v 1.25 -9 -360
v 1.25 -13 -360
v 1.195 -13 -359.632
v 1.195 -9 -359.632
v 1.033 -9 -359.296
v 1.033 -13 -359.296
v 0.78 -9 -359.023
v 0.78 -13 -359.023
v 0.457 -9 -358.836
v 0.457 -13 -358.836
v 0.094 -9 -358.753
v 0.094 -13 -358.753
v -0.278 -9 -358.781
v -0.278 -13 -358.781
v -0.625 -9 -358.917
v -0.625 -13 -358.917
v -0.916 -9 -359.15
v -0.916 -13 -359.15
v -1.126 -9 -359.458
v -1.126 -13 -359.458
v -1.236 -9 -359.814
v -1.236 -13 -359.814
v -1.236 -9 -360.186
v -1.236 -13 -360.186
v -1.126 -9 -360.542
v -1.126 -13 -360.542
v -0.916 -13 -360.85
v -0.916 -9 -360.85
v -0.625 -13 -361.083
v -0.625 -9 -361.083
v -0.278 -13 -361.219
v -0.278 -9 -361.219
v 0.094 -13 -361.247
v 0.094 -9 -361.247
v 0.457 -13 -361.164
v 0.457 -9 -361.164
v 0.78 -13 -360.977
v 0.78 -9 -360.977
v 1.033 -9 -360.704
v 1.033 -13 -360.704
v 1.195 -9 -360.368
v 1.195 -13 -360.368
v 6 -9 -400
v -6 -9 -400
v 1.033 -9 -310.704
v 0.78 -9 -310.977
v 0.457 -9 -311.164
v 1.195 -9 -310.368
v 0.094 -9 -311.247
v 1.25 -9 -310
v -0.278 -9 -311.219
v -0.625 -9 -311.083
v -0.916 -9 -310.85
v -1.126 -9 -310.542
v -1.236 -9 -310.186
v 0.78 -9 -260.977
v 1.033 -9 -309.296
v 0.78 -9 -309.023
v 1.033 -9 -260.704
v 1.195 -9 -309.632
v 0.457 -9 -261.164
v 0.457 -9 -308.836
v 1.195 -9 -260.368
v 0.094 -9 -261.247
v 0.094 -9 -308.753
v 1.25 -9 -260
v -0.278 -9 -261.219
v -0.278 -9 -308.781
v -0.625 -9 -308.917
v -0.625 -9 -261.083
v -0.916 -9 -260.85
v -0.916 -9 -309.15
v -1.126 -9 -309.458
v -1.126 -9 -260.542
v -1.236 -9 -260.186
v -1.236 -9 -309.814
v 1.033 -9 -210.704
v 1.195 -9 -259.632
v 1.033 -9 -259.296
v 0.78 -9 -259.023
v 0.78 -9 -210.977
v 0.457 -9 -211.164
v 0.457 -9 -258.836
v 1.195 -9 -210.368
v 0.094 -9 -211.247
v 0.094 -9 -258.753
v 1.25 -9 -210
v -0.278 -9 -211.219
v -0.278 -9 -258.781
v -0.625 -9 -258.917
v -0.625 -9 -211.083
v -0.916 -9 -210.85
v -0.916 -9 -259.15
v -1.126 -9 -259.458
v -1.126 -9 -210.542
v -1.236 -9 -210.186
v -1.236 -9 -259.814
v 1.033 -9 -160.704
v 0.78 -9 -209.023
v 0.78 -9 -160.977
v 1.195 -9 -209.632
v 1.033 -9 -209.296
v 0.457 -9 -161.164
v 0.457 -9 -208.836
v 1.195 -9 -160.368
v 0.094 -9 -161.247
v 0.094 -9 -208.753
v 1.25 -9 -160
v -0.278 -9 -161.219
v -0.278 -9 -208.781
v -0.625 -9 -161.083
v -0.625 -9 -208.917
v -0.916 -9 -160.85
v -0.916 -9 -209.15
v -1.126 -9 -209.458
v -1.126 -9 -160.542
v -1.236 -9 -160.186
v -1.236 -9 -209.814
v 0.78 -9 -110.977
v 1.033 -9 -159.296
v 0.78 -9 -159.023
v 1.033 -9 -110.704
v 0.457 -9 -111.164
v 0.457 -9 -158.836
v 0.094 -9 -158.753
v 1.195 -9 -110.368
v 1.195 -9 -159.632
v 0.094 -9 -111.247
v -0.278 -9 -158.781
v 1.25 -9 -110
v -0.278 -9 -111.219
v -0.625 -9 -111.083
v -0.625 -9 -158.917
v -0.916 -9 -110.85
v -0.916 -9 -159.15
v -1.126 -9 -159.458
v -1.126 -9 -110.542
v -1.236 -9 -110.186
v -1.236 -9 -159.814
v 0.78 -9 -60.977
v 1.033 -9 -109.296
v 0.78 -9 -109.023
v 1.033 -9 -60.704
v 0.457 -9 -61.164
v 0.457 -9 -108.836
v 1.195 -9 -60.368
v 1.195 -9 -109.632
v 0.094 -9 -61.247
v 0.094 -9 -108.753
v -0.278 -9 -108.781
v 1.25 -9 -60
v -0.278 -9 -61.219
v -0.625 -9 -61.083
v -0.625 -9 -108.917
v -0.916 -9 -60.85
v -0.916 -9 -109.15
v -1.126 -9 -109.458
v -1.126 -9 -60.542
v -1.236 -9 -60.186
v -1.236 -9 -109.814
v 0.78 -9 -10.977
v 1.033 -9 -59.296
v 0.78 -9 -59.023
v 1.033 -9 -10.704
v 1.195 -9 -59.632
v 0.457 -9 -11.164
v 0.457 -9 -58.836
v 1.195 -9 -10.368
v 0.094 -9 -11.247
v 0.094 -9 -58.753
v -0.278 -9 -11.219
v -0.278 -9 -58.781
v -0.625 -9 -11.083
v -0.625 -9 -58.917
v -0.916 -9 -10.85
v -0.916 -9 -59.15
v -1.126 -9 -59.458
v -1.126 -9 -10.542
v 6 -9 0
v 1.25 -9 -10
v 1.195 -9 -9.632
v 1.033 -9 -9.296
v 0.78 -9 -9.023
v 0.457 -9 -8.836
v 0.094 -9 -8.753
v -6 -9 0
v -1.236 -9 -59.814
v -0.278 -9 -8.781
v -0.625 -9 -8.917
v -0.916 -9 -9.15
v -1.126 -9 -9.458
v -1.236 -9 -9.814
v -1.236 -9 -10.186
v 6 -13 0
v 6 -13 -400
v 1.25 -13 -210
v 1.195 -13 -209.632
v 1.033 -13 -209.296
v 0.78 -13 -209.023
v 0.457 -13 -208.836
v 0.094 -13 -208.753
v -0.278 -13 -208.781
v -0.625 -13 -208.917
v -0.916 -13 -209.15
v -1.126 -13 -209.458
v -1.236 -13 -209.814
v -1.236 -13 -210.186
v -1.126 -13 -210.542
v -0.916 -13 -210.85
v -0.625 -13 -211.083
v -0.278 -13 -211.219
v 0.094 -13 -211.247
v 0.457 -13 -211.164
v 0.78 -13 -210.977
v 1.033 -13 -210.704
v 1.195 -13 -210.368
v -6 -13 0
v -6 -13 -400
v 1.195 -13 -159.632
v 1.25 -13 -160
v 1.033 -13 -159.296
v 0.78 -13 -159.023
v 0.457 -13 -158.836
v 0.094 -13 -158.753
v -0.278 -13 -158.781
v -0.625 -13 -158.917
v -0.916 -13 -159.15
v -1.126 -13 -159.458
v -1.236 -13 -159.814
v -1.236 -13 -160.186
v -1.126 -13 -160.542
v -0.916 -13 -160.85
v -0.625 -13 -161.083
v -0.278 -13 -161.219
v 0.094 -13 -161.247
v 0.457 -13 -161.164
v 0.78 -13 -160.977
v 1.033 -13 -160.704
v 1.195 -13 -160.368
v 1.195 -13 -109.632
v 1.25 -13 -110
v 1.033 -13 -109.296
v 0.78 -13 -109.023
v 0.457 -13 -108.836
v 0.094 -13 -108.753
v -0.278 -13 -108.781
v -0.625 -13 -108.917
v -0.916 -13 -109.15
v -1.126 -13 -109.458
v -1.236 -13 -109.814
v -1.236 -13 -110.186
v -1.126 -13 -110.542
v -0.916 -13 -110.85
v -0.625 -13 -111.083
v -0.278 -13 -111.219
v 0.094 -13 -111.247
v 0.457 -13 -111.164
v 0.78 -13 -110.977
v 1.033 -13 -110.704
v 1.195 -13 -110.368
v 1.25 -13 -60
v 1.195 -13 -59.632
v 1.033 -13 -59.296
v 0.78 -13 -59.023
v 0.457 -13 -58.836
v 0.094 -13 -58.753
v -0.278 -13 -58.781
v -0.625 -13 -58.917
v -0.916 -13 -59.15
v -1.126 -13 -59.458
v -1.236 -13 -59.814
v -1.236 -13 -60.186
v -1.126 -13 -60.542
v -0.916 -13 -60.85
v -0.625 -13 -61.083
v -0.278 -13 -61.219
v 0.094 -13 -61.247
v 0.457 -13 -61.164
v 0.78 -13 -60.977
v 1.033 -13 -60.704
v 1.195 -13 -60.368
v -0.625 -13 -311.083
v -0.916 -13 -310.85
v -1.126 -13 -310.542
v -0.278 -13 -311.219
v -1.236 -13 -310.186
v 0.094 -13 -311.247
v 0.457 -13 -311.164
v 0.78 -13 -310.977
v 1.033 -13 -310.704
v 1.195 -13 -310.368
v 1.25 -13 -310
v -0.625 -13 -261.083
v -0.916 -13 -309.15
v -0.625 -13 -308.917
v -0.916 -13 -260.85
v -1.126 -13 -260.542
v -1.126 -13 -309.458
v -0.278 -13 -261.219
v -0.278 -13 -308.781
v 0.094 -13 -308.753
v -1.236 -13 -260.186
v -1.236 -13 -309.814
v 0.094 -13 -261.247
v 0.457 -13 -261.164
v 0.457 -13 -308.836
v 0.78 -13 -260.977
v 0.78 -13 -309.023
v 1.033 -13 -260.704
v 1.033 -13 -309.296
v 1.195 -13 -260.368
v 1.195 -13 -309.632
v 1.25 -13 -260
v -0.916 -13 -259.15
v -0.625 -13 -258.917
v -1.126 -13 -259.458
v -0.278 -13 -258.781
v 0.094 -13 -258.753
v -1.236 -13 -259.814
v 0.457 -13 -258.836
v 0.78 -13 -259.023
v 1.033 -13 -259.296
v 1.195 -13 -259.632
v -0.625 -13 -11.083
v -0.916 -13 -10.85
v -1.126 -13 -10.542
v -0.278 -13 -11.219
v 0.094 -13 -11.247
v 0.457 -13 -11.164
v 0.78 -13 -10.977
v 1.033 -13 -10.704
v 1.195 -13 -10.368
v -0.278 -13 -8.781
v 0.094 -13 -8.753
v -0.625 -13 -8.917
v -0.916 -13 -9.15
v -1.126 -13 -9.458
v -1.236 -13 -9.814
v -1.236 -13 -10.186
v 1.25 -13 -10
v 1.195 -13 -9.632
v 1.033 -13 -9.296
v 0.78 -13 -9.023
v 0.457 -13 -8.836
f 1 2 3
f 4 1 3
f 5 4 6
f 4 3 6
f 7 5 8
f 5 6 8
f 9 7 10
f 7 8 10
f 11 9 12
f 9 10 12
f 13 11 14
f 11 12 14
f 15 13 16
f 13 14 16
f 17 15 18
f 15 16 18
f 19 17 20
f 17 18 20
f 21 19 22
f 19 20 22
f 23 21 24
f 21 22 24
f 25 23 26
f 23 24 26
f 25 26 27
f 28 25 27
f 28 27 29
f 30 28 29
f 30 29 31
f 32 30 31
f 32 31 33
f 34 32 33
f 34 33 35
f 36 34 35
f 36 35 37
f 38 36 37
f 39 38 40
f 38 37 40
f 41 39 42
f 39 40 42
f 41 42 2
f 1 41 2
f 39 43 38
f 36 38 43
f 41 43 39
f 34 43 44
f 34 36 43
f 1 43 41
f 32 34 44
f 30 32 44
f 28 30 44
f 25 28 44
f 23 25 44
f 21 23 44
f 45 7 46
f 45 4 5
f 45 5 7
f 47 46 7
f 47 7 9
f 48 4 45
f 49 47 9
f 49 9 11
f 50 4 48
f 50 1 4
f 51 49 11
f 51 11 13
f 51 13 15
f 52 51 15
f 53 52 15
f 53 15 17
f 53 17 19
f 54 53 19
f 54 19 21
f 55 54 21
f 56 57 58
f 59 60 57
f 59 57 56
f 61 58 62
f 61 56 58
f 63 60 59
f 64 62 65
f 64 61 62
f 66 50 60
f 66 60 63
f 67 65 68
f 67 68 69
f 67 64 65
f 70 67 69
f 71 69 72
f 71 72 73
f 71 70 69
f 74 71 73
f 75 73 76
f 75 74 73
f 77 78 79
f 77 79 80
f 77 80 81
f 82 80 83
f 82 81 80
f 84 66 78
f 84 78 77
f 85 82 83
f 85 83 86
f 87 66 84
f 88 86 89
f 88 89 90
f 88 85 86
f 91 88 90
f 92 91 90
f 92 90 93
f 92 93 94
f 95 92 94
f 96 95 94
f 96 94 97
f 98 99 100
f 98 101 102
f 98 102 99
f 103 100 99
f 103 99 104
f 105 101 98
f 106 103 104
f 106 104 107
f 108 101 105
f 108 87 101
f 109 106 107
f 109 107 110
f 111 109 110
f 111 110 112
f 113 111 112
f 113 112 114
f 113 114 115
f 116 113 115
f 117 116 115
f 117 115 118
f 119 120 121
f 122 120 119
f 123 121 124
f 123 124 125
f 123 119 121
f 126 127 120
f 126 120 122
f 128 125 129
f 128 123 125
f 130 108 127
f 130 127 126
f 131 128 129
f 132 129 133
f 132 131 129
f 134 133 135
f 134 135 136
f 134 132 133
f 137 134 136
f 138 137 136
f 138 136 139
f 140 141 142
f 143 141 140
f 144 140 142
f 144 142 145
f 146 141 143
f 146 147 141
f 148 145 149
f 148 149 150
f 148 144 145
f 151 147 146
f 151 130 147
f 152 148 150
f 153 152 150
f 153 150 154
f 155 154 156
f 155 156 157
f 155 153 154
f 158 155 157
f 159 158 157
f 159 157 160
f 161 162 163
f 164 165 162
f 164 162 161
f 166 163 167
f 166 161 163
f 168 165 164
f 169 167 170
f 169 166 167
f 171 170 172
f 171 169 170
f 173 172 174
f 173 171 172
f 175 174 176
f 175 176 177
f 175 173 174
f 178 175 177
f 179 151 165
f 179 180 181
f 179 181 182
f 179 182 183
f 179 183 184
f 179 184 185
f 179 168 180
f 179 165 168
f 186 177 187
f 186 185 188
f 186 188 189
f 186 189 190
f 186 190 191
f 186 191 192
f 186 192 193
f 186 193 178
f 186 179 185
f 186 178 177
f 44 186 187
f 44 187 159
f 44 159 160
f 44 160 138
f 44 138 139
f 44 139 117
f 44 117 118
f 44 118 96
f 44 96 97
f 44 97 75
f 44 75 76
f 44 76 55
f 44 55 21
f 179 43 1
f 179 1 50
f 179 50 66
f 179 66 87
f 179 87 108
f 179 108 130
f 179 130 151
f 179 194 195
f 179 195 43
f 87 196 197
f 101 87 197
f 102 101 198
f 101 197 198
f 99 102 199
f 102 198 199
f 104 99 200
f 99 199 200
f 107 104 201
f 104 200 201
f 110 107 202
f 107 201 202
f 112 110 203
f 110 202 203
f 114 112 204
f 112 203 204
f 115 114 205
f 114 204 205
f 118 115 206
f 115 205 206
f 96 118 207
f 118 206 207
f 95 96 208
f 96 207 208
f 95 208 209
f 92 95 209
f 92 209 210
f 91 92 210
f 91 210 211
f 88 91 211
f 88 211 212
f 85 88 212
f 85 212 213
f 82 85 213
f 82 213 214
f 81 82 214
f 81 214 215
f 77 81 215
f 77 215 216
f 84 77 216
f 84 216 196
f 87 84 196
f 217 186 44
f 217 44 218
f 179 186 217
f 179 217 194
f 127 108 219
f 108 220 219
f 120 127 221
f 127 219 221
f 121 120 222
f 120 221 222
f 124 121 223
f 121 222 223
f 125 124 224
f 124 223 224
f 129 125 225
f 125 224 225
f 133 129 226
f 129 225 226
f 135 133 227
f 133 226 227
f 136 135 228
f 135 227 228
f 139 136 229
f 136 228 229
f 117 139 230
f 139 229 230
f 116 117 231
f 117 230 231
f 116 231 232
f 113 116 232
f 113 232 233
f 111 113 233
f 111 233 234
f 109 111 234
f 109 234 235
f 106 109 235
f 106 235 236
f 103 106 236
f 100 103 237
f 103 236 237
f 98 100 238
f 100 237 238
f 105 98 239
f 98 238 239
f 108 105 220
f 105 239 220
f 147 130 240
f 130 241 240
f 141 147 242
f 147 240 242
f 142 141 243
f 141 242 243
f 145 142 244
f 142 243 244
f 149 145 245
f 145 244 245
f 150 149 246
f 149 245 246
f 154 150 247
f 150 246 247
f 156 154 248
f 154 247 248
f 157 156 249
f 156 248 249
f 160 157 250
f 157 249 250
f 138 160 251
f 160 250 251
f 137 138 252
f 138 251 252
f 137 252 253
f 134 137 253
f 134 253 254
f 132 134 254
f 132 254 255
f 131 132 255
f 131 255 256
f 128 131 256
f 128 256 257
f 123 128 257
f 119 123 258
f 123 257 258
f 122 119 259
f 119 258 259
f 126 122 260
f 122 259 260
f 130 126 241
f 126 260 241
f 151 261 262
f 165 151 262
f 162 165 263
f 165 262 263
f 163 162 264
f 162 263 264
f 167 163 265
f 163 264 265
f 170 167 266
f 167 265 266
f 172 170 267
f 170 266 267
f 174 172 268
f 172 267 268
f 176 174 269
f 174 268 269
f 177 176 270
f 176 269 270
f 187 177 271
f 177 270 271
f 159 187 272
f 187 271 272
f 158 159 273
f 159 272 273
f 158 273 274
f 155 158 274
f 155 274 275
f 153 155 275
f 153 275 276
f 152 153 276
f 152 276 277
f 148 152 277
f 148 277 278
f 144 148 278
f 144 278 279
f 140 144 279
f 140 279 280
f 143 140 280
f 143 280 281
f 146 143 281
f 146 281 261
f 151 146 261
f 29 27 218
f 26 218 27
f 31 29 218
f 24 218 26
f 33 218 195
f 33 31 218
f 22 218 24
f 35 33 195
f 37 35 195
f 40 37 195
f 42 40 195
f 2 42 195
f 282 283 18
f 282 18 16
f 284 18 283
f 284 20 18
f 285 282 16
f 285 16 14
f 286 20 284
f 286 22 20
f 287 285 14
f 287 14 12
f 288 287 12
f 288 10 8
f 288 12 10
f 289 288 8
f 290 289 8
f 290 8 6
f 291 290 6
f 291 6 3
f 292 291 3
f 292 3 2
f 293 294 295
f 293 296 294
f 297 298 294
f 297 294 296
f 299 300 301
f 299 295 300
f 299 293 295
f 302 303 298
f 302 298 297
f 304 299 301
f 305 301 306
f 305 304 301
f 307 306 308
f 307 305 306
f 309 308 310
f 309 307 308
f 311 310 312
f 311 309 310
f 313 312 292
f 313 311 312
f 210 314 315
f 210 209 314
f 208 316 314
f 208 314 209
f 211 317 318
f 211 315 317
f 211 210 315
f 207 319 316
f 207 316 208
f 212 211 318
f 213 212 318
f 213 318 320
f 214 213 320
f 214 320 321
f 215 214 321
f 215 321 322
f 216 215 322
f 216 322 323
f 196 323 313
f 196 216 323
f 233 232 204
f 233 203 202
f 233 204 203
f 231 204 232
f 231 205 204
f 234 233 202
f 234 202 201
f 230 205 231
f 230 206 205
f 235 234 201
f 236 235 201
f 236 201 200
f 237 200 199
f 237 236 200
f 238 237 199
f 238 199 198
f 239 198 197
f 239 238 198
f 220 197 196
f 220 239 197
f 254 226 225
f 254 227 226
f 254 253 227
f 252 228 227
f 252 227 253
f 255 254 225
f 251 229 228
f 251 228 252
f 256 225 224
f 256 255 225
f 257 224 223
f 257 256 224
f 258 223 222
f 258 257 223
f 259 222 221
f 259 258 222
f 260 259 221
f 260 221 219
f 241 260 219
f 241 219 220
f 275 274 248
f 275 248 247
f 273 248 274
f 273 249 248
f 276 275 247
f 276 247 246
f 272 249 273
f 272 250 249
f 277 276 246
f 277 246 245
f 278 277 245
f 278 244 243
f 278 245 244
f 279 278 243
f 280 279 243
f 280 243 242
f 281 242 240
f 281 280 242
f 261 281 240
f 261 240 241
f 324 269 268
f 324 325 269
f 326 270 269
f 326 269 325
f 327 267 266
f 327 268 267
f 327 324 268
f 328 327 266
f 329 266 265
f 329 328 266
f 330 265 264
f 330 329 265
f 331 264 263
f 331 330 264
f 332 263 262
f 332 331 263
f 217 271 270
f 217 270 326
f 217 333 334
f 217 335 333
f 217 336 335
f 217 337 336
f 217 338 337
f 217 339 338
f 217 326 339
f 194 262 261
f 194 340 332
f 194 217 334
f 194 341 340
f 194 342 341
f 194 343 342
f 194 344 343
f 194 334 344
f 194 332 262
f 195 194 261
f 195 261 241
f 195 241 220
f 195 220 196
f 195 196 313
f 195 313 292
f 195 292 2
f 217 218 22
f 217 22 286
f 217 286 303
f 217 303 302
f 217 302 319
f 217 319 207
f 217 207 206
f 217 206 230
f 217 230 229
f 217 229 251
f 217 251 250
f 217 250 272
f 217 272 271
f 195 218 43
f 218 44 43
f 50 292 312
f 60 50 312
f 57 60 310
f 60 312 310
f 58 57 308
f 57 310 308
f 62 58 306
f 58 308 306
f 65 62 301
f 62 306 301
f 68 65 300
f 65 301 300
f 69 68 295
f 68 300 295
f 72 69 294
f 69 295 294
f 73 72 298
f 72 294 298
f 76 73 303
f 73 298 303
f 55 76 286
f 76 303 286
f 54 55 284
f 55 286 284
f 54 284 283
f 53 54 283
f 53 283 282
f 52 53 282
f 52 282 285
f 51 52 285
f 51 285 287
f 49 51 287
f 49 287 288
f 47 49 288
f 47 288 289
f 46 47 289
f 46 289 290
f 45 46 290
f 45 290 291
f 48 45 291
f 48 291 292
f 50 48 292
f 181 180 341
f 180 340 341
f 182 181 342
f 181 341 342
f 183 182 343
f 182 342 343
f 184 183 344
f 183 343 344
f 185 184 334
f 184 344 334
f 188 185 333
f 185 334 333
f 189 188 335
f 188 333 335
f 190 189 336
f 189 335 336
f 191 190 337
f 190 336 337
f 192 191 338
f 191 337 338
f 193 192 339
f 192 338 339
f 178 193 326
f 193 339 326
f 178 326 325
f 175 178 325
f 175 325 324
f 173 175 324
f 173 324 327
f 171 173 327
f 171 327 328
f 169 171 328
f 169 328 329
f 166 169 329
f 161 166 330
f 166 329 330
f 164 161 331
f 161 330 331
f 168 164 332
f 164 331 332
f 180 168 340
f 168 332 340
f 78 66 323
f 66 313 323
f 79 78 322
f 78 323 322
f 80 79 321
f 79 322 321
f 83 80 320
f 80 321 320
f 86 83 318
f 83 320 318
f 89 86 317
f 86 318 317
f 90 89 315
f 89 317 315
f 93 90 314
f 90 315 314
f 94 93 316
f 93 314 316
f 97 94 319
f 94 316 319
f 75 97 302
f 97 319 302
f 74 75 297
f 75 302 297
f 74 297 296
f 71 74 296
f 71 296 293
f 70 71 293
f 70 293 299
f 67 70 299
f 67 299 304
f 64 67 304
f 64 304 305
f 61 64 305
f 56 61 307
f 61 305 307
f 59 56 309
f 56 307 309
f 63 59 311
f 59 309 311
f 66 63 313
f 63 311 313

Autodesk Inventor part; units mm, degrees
ref_plane "YZ Plane" through (0, 0, 0) normal (1, 0, 0) x (0, 1, 0)
ref_plane "XZ Plane" through (0, 0, 0) normal (0, 1, 0) x (-1, 0, 0)
ref_plane "XY Plane" through (0, 0, 0) normal (0, 0, 1) x (1, 0, 0)
sketch "Sketch1" plane through (0, 0, 0) normal (0, 0, 1) x (1, 0, 0)
  line L0 (8.25, 13) -> (8.25, 9.6642) projected
  line L1 (8.25, 9.6642) -> (4.1, 5.5142) projected
  line L2 (4.1, 5.5142) -> (-4.1, 5.5142) projected
  line L3 (-4.1, 5.5142) -> (-8.25, 9.6642) projected
  line L4 (-8.25, 9.6642) -> (-8.25, 13) projected
  line L5 (-8.25, 13) -> (-4.1, 13) projected
  line L6 (-4.1, 13) -> (-4.1, 14) projected
  line L7 (-4.1, 14) -> (-5.1, 14) projected
  line L8 (-5.1, 14) -> (-5.1, 15) projected
  line L9 (-5.1, 15) -> (-13, 15) projected
  arc A0 (-13, 15) -> (-15, 13) centre (-13, 13) ccw projected
  line L10 (-15, 13) -> (-15, 5.1) projected
  line L11 (-15, 5.1) -> (-14, 5.1) projected
  line L12 (-14, 5.1) -> (-14, 4.1) projected
  line L13 (-14, 4.1) -> (-13, 4.1) projected
  line L14 (-13, 4.1) -> (-13, 8.25) projected
  line L15 (-13, 8.25) -> (-9.6642, 8.25) projected
  line L16 (-9.6642, 8.25) -> (-5.5142, 4.1) projected
  line L17 (-5.5142, 4.1) -> (-5.5142, -4.1) projected
  line L18 (-5.5142, -4.1) -> (-9.6642, -8.25) projected
  line L19 (-9.6642, -8.25) -> (-13, -8.25) projected
  line L20 (-13, -8.25) -> (-13, -4.1) projected
  line L21 (-13, -4.1) -> (-14, -4.1) projected
  line L22 (-14, -4.1) -> (-14, -5.1) projected
  line L23 (-14, -5.1) -> (-15, -5.1) projected
  line L24 (-15, -5.1) -> (-15, -13) projected
  arc A1 (-15, -13) -> (-13, -15) centre (-13, -13) ccw projected
  line L25 (-13, -15) -> (-5.1, -15) projected
  line L26 (-5.1, -15) -> (-5.1, -14) projected
  line L27 (-5.1, -14) -> (-4.1, -14) projected
  line L28 (-4.1, -14) -> (-4.1, -13) projected
  line L29 (-4.1, -13) -> (-8.25, -13) projected
  line L30 (-8.25, -13) -> (-8.25, -9.6642) projected
  line L31 (-8.25, -9.6642) -> (-4.1, -5.5142) projected
  line L32 (-4.1, -5.5142) -> (4.1, -5.5142) projected
  line L33 (4.1, -5.5142) -> (8.25, -9.6642) projected
  line L34 (8.25, -9.6642) -> (8.25, -13) projected
  line L35 (8.25, -13) -> (4.1, -13) projected
  line L36 (4.1, -13) -> (4.1, -14) projected
  line L37 (4.1, -14) -> (5.1, -14) projected
  line L38 (5.1, -14) -> (5.1, -15) projected
  line L39 (5.1, -15) -> (13, -15) projected
  arc A2 (13, -15) -> (15, -13) centre (13, -13) ccw projected
  line L40 (15, -13) -> (15, -5.1) projected
  line L41 (15, -5.1) -> (14, -5.1) projected
  line L42 (14, -5.1) -> (14, -4.1) projected
  line L43 (14, -4.1) -> (13, -4.1) projected
  line L44 (13, -4.1) -> (13, -8.25) projected
  line L45 (13, -8.25) -> (9.6642, -8.25) projected
  line L46 (9.6642, -8.25) -> (5.5142, -4.1) projected
  line L47 (5.5142, -4.1) -> (5.5142, 4.1) projected
  line L48 (5.5142, 4.1) -> (9.6642, 8.25) projected
  line L49 (9.6642, 8.25) -> (13, 8.25) projected
  line L50 (13, 8.25) -> (13, 4.1) projected
  line L51 (13, 4.1) -> (14, 4.1) projected
  line L52 (14, 4.1) -> (14, 5.1) projected
  line L53 (14, 5.1) -> (15, 5.1) projected
  line L54 (15, 5.1) -> (15, 13) projected
  arc A3 (15, 13) -> (13, 15) centre (13, 13) ccw projected
  line L55 (13, 15) -> (5.1, 15) projected
  line L56 (5.1, 15) -> (5.1, 14) projected
  line L57 (5.1, 14) -> (4.1, 14) projected
  line L58 (4.1, 14) -> (4.1, 13) projected
  line L59 (4.1, 13) -> (8.25, 13) projected
  arc A4 (9.75, -12.5) -> (10.75, -13.5) centre (10.75, -12.5) ccw projected
  line L60 (9.75, -12.5) -> (9.75, -10.75) projected
  arc A5 (10.75, -9.75) -> (9.75, -10.75) centre (10.75, -10.75) ccw projected
  line L61 (10.75, -9.75) -> (12.5, -9.75) projected
  arc A6 (13.5, -10.75) -> (12.5, -9.75) centre (12.5, -10.75) ccw projected
  line L62 (13.5, -10.75) -> (13.5, -12.5) projected
  arc A7 (12.5, -13.5) -> (13.5, -12.5) centre (12.5, -12.5) ccw projected
  line L63 (12.5, -13.5) -> (10.75, -13.5) projected
  arc A8 (-13.5, 10.75) -> (-12.5, 9.75) centre (-12.5, 10.75) ccw projected
  line L64 (-13.5, 10.75) -> (-13.5, 12.5) projected
  arc A9 (-12.5, 13.5) -> (-13.5, 12.5) centre (-12.5, 12.5) ccw projected
  line L65 (-12.5, 13.5) -> (-10.75, 13.5) projected
  arc A10 (-9.75, 12.5) -> (-10.75, 13.5) centre (-10.75, 12.5) ccw projected
  line L66 (-9.75, 12.5) -> (-9.75, 10.75) projected
  arc A11 (-10.75, 9.75) -> (-9.75, 10.75) centre (-10.75, 10.75) ccw projected
  line L67 (-10.75, 9.75) -> (-12.5, 9.75) projected
  circle A12 centre (0, 0) radius 3.4 projected
  line L68 (9.75, 10.75) -> (9.75, 12.5) projected
  arc A13 (10.75, 13.5) -> (9.75, 12.5) centre (10.75, 12.5) ccw projected
  line L69 (10.75, 13.5) -> (12.5, 13.5) projected
  arc A14 (13.5, 12.5) -> (12.5, 13.5) centre (12.5, 12.5) ccw projected
  line L70 (13.5, 12.5) -> (13.5, 10.75) projected
  arc A15 (12.5, 9.75) -> (13.5, 10.75) centre (12.5, 10.75) ccw projected
  line L71 (12.5, 9.75) -> (10.75, 9.75) projected
  arc A16 (9.75, 10.75) -> (10.75, 9.75) centre (10.75, 10.75) ccw projected
  arc A17 (-12.5, -9.75) -> (-13.5, -10.75) centre (-12.5, -10.75) ccw projected
  line L72 (-12.5, -9.75) -> (-10.75, -9.75) projected
  arc A18 (-9.75, -10.75) -> (-10.75, -9.75) centre (-10.75, -10.75) ccw projected
  line L73 (-9.75, -10.75) -> (-9.75, -12.5) projected
  arc A19 (-10.75, -13.5) -> (-9.75, -12.5) centre (-10.75, -12.5) ccw projected
  line L74 (-10.75, -13.5) -> (-12.5, -13.5) projected
  arc A20 (-13.5, -12.5) -> (-12.5, -13.5) centre (-12.5, -12.5) ccw projected
  line L75 (-13.5, -12.5) -> (-13.5, -10.75) projected
  line L76 (-6, -13) -> (6, -13)
  line L77 (6, -13) -> (6, -9)
  line L78 (6, -9) -> (-6, -9)
  line L79 (-6, -9) -> (-6, -13)
  line L80 (0, -5.5142) -> (0, -26.3036) construction
  point P0 (0, 0)
  dimension "d0" = 4
  dimension "d1" = 12
extrude "Extrusion1" add sketch "Sketch1" against normal blind 400 contours L76 L29 L79 L78 L77 L35
sketch "Sketch2" plane through (-6, -13, 0) normal (0, -1, 0) x (1, 0, 0)
  circle A0 centre (6.0003, -10) radius 3 projected
  circle A1 centre (6.0003, -35) radius 3 projected
  circle A2 centre (6.0003, -10) radius 1.25
  point P0 (6, 0)
  dimension "d4" = 2.5
extrude "Extrusion2" cut sketch "Sketch2" against normal blind 400 contours A2
pattern_linear "Rectangular Pattern1" count 8 spacing 50 along (0, 0, -1) of "Extrusion2"
properties part number "Rain T Slot"
